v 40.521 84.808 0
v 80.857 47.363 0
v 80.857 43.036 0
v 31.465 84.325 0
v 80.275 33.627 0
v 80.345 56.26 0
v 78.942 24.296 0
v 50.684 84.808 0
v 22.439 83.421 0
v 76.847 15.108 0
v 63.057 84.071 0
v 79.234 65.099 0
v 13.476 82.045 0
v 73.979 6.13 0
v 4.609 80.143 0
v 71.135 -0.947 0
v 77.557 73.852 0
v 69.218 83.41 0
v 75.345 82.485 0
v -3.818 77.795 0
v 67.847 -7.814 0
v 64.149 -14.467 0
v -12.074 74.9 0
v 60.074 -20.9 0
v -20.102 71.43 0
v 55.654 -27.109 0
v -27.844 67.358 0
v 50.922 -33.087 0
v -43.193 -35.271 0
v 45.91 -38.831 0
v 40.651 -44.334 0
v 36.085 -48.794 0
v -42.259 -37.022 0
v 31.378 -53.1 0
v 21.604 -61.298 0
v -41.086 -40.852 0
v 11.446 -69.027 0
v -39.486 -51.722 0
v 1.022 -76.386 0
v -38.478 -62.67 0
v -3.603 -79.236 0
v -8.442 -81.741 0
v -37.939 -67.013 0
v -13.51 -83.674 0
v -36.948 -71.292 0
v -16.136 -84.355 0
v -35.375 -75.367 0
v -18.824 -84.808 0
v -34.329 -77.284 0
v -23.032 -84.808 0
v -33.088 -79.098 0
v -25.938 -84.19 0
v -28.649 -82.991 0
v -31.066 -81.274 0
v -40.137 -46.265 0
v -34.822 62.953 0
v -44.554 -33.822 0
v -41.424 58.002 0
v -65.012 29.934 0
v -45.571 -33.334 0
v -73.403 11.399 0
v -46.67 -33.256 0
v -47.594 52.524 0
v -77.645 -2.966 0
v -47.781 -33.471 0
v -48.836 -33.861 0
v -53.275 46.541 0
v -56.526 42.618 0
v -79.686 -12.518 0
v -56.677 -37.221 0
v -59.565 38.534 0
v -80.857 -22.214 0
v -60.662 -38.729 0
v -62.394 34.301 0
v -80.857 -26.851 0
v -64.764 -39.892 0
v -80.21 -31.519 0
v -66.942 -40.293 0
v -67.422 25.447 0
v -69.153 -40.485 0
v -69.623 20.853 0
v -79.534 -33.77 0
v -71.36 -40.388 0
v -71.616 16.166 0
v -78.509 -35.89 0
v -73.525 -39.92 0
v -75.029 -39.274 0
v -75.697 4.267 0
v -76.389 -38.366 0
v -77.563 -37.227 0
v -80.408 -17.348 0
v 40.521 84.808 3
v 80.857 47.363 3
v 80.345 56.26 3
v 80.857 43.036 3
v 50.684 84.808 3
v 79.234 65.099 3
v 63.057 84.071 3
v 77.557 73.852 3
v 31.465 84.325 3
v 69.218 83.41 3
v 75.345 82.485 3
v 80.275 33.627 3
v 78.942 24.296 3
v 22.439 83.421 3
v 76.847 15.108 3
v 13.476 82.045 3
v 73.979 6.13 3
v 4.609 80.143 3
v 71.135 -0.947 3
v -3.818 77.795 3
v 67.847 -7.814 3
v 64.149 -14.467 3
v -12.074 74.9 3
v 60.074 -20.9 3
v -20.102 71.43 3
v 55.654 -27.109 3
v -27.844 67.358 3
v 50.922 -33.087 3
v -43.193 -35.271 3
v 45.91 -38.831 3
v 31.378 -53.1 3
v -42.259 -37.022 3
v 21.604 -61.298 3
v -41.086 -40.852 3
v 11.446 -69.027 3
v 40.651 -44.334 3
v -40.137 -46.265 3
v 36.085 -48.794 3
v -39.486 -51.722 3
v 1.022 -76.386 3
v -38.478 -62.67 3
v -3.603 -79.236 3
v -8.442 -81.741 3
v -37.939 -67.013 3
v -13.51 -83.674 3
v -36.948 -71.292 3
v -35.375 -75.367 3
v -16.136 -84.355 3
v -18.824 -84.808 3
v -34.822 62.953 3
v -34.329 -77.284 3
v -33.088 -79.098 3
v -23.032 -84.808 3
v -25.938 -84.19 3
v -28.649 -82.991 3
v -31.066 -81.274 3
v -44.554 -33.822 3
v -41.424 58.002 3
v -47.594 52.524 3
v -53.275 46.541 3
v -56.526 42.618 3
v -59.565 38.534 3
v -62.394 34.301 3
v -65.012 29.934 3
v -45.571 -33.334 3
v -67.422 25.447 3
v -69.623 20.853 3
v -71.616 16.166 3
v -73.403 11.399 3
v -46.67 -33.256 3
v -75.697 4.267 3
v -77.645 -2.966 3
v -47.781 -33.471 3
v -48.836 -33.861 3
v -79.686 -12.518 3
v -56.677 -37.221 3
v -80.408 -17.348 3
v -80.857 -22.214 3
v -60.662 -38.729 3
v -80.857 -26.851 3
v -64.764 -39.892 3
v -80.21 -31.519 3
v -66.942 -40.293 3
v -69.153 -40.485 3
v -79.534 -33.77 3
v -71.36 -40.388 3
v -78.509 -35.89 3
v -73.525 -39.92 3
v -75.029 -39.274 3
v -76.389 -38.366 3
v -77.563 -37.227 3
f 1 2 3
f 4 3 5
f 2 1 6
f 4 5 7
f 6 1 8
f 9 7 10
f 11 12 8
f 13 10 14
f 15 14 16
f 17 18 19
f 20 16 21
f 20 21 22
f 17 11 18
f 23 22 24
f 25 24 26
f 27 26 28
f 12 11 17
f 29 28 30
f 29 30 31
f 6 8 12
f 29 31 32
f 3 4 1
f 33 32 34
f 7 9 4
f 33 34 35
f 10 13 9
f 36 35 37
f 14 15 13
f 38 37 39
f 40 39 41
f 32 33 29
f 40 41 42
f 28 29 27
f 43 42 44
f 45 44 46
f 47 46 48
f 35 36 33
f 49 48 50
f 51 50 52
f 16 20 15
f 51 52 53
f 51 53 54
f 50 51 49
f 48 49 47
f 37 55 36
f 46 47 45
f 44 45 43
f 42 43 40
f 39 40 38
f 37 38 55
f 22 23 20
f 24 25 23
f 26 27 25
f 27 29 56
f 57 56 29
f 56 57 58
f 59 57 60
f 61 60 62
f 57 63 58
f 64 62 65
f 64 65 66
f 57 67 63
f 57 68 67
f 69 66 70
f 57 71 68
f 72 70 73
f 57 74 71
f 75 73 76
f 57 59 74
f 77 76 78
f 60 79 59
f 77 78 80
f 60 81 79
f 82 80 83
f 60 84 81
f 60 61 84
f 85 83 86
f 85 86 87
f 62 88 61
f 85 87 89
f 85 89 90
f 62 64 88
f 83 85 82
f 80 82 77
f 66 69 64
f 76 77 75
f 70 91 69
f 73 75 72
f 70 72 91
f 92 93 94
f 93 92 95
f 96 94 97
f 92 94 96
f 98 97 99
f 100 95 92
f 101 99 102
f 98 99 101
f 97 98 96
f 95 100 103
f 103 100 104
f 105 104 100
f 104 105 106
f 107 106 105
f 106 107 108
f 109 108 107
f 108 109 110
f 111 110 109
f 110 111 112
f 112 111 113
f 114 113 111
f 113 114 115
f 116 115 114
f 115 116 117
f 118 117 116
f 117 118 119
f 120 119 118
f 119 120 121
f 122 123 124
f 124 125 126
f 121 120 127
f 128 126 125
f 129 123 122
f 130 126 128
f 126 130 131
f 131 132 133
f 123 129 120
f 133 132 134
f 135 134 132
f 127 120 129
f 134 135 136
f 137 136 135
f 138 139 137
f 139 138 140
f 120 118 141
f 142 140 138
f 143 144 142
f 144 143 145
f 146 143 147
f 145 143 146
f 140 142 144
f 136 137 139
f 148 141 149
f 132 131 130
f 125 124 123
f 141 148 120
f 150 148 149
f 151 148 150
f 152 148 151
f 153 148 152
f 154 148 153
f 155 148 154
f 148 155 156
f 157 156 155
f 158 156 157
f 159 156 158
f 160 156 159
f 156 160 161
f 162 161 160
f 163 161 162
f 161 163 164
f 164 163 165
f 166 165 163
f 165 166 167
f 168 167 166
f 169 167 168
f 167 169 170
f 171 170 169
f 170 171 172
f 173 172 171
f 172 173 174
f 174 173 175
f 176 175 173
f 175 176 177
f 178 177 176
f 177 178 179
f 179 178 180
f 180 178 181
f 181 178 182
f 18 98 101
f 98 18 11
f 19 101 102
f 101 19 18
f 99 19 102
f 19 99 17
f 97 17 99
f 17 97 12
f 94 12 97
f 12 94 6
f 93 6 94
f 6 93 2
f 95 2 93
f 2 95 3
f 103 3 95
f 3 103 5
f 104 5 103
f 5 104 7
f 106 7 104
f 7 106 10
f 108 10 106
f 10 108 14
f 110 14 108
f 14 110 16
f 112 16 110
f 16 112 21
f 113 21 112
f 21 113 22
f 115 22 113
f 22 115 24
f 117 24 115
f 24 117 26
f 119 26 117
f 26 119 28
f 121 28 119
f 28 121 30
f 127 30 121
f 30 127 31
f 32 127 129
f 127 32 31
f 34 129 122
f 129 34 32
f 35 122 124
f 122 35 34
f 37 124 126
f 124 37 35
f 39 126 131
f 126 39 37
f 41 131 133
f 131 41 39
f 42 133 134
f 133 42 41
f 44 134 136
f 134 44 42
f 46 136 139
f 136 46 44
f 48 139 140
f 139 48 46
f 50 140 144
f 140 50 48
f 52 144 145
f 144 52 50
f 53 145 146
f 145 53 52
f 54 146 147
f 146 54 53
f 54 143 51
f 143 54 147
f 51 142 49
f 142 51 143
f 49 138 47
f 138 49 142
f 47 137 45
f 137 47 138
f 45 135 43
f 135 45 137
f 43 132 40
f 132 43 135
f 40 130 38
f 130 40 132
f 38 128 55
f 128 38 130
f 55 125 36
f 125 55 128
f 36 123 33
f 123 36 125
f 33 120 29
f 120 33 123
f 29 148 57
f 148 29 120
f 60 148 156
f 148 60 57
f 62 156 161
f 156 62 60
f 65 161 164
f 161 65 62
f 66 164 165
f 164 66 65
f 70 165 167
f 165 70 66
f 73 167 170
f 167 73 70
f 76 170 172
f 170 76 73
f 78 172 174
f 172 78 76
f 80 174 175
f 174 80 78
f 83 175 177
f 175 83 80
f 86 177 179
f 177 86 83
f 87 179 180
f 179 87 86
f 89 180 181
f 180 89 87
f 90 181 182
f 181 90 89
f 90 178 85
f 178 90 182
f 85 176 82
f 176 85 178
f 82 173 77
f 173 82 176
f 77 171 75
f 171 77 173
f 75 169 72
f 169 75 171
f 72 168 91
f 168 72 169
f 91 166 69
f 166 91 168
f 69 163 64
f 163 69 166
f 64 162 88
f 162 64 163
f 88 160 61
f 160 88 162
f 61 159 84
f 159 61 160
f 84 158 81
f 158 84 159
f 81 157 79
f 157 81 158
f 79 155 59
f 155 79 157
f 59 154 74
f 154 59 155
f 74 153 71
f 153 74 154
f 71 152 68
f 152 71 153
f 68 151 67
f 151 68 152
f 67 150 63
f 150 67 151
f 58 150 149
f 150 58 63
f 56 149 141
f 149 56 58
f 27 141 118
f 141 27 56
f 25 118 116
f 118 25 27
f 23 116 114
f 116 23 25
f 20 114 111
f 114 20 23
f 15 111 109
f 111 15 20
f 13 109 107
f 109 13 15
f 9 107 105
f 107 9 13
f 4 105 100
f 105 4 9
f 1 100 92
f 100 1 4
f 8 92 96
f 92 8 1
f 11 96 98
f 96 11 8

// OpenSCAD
// Module names are of the form poly_<inkscape-path-id>().  As a result,
// you can associate a polygon in this OpenSCAD program with the corresponding
// SVG element in the Inkscape document by looking for the XML element with
// the attribute id="inkscape-path-id".

// fudge value is used to ensure that subtracted solids are a tad taller
// in the z dimension than the polygon being subtracted from.  This helps
// keep the resulting .stl file manifold.
fudge = 0.1;

module poly_path8(h)
{
  scale([25.4/90, -25.4/90, 1]) union()
  {
    linear_extrude(height=h)
      polygon([[-12.040000,-27.810000],[173.010000,-183.470000],[161.631250,-171.117500],[150.020000,-158.960000],[-1.860000,0.520000],[93.800000,95.190000],[102.730000,104.350000],[-17.240000,21.700000],[-82.180000,182.870000],[-43.100000,9.430000],[-197.420000,51.420000],[-43.800000,-15.660000],[-76.190000,-137.750000],[-12.040000,-27.810000]]);
  }
}

module poly_path4(h)
{
  scale([25.4/90, -25.4/90, 1]) union()
  {
    linear_extrude(height=h)
      polygon([[143.580000,-300.500000],[179.590000,-300.500000],[223.430000,-297.888750],[245.259063,-295.548594],[266.970000,-292.270000],[274.807031,-261.678750],[280.751250,-230.667500],[284.687344,-199.345000],[286.500000,-167.820000],[286.500000,-152.490000],[284.438750,-119.152031],[279.715000,-86.088750],[272.291250,-53.533594],[262.130000,-21.720000],[252.051504,3.355098],[240.403281,27.688281],[227.301230,51.261387],[212.861250,74.056250],[197.199238,96.054707],[180.431094,117.238594],[162.672715,137.589746],[144.040000,157.090000],[127.859473,172.893242],[111.182656,188.149688],[76.548750,217.197500],[40.555469,244.584063],[3.620000,270.660000],[-12.767500,280.757656],[-29.912500,289.633750],[-47.871250,296.482969],[-57.173359,298.895840],[-66.700000,300.500000],[-81.610000,300.500000],[-91.906406,298.310781],[-101.513750,294.063750],[-110.076719,287.977344],[-117.240000,280.270000],[-121.637676,273.841543],[-125.344531,267.047344],[-130.918750,252.608750],[-134.428594,237.448281],[-136.340000,222.060000],[-139.910000,183.266250],[-142.218125,163.932656],[-145.580000,144.750000],[-149.737500,131.181250],[-153.047188,124.976719],[-157.870000,119.840000],[-161.472188,118.111094],[-165.365000,117.836250],[-169.302813,118.598281],[-173.040000,119.980000],[-200.825000,131.883750],[-214.943438,137.227656],[-229.480000,141.350000],[-237.195938,142.770469],[-245.030000,143.451250],[-252.849063,143.106406],[-260.520000,141.450000],[-265.850000,139.161094],[-270.670000,135.941250],[-274.830000,131.905781],[-278.180000,127.170000],[-281.814375,119.656563],[-284.207500,111.680000],[-286.500000,95.140000],[-286.500000,78.710000],[-284.908906,61.469687],[-282.351250,44.355000],[-275.120000,10.510000],[-268.216250,-15.120000],[-260.090000,-40.390000],[-253.758574,-57.279395],[-246.694844,-73.887656],[-238.895879,-90.166152],[-230.358750,-106.066250],[-221.080527,-121.539316],[-211.058281,-136.536719],[-200.289082,-151.009824],[-188.770000,-164.910000],[-168.639219,-186.110000],[-146.778750,-205.517500],[-123.386406,-223.061250],[-98.660000,-238.670000],[-71.227344,-253.097188],[-42.781250,-265.392500],[-13.527031,-275.651563],[16.330000,-283.970000],[47.751094,-290.709687],[79.508750,-295.587500],[111.489531,-298.789062],[143.580000,-300.500000]]);
  }
}

poly_path8(3);
poly_path4(3);
